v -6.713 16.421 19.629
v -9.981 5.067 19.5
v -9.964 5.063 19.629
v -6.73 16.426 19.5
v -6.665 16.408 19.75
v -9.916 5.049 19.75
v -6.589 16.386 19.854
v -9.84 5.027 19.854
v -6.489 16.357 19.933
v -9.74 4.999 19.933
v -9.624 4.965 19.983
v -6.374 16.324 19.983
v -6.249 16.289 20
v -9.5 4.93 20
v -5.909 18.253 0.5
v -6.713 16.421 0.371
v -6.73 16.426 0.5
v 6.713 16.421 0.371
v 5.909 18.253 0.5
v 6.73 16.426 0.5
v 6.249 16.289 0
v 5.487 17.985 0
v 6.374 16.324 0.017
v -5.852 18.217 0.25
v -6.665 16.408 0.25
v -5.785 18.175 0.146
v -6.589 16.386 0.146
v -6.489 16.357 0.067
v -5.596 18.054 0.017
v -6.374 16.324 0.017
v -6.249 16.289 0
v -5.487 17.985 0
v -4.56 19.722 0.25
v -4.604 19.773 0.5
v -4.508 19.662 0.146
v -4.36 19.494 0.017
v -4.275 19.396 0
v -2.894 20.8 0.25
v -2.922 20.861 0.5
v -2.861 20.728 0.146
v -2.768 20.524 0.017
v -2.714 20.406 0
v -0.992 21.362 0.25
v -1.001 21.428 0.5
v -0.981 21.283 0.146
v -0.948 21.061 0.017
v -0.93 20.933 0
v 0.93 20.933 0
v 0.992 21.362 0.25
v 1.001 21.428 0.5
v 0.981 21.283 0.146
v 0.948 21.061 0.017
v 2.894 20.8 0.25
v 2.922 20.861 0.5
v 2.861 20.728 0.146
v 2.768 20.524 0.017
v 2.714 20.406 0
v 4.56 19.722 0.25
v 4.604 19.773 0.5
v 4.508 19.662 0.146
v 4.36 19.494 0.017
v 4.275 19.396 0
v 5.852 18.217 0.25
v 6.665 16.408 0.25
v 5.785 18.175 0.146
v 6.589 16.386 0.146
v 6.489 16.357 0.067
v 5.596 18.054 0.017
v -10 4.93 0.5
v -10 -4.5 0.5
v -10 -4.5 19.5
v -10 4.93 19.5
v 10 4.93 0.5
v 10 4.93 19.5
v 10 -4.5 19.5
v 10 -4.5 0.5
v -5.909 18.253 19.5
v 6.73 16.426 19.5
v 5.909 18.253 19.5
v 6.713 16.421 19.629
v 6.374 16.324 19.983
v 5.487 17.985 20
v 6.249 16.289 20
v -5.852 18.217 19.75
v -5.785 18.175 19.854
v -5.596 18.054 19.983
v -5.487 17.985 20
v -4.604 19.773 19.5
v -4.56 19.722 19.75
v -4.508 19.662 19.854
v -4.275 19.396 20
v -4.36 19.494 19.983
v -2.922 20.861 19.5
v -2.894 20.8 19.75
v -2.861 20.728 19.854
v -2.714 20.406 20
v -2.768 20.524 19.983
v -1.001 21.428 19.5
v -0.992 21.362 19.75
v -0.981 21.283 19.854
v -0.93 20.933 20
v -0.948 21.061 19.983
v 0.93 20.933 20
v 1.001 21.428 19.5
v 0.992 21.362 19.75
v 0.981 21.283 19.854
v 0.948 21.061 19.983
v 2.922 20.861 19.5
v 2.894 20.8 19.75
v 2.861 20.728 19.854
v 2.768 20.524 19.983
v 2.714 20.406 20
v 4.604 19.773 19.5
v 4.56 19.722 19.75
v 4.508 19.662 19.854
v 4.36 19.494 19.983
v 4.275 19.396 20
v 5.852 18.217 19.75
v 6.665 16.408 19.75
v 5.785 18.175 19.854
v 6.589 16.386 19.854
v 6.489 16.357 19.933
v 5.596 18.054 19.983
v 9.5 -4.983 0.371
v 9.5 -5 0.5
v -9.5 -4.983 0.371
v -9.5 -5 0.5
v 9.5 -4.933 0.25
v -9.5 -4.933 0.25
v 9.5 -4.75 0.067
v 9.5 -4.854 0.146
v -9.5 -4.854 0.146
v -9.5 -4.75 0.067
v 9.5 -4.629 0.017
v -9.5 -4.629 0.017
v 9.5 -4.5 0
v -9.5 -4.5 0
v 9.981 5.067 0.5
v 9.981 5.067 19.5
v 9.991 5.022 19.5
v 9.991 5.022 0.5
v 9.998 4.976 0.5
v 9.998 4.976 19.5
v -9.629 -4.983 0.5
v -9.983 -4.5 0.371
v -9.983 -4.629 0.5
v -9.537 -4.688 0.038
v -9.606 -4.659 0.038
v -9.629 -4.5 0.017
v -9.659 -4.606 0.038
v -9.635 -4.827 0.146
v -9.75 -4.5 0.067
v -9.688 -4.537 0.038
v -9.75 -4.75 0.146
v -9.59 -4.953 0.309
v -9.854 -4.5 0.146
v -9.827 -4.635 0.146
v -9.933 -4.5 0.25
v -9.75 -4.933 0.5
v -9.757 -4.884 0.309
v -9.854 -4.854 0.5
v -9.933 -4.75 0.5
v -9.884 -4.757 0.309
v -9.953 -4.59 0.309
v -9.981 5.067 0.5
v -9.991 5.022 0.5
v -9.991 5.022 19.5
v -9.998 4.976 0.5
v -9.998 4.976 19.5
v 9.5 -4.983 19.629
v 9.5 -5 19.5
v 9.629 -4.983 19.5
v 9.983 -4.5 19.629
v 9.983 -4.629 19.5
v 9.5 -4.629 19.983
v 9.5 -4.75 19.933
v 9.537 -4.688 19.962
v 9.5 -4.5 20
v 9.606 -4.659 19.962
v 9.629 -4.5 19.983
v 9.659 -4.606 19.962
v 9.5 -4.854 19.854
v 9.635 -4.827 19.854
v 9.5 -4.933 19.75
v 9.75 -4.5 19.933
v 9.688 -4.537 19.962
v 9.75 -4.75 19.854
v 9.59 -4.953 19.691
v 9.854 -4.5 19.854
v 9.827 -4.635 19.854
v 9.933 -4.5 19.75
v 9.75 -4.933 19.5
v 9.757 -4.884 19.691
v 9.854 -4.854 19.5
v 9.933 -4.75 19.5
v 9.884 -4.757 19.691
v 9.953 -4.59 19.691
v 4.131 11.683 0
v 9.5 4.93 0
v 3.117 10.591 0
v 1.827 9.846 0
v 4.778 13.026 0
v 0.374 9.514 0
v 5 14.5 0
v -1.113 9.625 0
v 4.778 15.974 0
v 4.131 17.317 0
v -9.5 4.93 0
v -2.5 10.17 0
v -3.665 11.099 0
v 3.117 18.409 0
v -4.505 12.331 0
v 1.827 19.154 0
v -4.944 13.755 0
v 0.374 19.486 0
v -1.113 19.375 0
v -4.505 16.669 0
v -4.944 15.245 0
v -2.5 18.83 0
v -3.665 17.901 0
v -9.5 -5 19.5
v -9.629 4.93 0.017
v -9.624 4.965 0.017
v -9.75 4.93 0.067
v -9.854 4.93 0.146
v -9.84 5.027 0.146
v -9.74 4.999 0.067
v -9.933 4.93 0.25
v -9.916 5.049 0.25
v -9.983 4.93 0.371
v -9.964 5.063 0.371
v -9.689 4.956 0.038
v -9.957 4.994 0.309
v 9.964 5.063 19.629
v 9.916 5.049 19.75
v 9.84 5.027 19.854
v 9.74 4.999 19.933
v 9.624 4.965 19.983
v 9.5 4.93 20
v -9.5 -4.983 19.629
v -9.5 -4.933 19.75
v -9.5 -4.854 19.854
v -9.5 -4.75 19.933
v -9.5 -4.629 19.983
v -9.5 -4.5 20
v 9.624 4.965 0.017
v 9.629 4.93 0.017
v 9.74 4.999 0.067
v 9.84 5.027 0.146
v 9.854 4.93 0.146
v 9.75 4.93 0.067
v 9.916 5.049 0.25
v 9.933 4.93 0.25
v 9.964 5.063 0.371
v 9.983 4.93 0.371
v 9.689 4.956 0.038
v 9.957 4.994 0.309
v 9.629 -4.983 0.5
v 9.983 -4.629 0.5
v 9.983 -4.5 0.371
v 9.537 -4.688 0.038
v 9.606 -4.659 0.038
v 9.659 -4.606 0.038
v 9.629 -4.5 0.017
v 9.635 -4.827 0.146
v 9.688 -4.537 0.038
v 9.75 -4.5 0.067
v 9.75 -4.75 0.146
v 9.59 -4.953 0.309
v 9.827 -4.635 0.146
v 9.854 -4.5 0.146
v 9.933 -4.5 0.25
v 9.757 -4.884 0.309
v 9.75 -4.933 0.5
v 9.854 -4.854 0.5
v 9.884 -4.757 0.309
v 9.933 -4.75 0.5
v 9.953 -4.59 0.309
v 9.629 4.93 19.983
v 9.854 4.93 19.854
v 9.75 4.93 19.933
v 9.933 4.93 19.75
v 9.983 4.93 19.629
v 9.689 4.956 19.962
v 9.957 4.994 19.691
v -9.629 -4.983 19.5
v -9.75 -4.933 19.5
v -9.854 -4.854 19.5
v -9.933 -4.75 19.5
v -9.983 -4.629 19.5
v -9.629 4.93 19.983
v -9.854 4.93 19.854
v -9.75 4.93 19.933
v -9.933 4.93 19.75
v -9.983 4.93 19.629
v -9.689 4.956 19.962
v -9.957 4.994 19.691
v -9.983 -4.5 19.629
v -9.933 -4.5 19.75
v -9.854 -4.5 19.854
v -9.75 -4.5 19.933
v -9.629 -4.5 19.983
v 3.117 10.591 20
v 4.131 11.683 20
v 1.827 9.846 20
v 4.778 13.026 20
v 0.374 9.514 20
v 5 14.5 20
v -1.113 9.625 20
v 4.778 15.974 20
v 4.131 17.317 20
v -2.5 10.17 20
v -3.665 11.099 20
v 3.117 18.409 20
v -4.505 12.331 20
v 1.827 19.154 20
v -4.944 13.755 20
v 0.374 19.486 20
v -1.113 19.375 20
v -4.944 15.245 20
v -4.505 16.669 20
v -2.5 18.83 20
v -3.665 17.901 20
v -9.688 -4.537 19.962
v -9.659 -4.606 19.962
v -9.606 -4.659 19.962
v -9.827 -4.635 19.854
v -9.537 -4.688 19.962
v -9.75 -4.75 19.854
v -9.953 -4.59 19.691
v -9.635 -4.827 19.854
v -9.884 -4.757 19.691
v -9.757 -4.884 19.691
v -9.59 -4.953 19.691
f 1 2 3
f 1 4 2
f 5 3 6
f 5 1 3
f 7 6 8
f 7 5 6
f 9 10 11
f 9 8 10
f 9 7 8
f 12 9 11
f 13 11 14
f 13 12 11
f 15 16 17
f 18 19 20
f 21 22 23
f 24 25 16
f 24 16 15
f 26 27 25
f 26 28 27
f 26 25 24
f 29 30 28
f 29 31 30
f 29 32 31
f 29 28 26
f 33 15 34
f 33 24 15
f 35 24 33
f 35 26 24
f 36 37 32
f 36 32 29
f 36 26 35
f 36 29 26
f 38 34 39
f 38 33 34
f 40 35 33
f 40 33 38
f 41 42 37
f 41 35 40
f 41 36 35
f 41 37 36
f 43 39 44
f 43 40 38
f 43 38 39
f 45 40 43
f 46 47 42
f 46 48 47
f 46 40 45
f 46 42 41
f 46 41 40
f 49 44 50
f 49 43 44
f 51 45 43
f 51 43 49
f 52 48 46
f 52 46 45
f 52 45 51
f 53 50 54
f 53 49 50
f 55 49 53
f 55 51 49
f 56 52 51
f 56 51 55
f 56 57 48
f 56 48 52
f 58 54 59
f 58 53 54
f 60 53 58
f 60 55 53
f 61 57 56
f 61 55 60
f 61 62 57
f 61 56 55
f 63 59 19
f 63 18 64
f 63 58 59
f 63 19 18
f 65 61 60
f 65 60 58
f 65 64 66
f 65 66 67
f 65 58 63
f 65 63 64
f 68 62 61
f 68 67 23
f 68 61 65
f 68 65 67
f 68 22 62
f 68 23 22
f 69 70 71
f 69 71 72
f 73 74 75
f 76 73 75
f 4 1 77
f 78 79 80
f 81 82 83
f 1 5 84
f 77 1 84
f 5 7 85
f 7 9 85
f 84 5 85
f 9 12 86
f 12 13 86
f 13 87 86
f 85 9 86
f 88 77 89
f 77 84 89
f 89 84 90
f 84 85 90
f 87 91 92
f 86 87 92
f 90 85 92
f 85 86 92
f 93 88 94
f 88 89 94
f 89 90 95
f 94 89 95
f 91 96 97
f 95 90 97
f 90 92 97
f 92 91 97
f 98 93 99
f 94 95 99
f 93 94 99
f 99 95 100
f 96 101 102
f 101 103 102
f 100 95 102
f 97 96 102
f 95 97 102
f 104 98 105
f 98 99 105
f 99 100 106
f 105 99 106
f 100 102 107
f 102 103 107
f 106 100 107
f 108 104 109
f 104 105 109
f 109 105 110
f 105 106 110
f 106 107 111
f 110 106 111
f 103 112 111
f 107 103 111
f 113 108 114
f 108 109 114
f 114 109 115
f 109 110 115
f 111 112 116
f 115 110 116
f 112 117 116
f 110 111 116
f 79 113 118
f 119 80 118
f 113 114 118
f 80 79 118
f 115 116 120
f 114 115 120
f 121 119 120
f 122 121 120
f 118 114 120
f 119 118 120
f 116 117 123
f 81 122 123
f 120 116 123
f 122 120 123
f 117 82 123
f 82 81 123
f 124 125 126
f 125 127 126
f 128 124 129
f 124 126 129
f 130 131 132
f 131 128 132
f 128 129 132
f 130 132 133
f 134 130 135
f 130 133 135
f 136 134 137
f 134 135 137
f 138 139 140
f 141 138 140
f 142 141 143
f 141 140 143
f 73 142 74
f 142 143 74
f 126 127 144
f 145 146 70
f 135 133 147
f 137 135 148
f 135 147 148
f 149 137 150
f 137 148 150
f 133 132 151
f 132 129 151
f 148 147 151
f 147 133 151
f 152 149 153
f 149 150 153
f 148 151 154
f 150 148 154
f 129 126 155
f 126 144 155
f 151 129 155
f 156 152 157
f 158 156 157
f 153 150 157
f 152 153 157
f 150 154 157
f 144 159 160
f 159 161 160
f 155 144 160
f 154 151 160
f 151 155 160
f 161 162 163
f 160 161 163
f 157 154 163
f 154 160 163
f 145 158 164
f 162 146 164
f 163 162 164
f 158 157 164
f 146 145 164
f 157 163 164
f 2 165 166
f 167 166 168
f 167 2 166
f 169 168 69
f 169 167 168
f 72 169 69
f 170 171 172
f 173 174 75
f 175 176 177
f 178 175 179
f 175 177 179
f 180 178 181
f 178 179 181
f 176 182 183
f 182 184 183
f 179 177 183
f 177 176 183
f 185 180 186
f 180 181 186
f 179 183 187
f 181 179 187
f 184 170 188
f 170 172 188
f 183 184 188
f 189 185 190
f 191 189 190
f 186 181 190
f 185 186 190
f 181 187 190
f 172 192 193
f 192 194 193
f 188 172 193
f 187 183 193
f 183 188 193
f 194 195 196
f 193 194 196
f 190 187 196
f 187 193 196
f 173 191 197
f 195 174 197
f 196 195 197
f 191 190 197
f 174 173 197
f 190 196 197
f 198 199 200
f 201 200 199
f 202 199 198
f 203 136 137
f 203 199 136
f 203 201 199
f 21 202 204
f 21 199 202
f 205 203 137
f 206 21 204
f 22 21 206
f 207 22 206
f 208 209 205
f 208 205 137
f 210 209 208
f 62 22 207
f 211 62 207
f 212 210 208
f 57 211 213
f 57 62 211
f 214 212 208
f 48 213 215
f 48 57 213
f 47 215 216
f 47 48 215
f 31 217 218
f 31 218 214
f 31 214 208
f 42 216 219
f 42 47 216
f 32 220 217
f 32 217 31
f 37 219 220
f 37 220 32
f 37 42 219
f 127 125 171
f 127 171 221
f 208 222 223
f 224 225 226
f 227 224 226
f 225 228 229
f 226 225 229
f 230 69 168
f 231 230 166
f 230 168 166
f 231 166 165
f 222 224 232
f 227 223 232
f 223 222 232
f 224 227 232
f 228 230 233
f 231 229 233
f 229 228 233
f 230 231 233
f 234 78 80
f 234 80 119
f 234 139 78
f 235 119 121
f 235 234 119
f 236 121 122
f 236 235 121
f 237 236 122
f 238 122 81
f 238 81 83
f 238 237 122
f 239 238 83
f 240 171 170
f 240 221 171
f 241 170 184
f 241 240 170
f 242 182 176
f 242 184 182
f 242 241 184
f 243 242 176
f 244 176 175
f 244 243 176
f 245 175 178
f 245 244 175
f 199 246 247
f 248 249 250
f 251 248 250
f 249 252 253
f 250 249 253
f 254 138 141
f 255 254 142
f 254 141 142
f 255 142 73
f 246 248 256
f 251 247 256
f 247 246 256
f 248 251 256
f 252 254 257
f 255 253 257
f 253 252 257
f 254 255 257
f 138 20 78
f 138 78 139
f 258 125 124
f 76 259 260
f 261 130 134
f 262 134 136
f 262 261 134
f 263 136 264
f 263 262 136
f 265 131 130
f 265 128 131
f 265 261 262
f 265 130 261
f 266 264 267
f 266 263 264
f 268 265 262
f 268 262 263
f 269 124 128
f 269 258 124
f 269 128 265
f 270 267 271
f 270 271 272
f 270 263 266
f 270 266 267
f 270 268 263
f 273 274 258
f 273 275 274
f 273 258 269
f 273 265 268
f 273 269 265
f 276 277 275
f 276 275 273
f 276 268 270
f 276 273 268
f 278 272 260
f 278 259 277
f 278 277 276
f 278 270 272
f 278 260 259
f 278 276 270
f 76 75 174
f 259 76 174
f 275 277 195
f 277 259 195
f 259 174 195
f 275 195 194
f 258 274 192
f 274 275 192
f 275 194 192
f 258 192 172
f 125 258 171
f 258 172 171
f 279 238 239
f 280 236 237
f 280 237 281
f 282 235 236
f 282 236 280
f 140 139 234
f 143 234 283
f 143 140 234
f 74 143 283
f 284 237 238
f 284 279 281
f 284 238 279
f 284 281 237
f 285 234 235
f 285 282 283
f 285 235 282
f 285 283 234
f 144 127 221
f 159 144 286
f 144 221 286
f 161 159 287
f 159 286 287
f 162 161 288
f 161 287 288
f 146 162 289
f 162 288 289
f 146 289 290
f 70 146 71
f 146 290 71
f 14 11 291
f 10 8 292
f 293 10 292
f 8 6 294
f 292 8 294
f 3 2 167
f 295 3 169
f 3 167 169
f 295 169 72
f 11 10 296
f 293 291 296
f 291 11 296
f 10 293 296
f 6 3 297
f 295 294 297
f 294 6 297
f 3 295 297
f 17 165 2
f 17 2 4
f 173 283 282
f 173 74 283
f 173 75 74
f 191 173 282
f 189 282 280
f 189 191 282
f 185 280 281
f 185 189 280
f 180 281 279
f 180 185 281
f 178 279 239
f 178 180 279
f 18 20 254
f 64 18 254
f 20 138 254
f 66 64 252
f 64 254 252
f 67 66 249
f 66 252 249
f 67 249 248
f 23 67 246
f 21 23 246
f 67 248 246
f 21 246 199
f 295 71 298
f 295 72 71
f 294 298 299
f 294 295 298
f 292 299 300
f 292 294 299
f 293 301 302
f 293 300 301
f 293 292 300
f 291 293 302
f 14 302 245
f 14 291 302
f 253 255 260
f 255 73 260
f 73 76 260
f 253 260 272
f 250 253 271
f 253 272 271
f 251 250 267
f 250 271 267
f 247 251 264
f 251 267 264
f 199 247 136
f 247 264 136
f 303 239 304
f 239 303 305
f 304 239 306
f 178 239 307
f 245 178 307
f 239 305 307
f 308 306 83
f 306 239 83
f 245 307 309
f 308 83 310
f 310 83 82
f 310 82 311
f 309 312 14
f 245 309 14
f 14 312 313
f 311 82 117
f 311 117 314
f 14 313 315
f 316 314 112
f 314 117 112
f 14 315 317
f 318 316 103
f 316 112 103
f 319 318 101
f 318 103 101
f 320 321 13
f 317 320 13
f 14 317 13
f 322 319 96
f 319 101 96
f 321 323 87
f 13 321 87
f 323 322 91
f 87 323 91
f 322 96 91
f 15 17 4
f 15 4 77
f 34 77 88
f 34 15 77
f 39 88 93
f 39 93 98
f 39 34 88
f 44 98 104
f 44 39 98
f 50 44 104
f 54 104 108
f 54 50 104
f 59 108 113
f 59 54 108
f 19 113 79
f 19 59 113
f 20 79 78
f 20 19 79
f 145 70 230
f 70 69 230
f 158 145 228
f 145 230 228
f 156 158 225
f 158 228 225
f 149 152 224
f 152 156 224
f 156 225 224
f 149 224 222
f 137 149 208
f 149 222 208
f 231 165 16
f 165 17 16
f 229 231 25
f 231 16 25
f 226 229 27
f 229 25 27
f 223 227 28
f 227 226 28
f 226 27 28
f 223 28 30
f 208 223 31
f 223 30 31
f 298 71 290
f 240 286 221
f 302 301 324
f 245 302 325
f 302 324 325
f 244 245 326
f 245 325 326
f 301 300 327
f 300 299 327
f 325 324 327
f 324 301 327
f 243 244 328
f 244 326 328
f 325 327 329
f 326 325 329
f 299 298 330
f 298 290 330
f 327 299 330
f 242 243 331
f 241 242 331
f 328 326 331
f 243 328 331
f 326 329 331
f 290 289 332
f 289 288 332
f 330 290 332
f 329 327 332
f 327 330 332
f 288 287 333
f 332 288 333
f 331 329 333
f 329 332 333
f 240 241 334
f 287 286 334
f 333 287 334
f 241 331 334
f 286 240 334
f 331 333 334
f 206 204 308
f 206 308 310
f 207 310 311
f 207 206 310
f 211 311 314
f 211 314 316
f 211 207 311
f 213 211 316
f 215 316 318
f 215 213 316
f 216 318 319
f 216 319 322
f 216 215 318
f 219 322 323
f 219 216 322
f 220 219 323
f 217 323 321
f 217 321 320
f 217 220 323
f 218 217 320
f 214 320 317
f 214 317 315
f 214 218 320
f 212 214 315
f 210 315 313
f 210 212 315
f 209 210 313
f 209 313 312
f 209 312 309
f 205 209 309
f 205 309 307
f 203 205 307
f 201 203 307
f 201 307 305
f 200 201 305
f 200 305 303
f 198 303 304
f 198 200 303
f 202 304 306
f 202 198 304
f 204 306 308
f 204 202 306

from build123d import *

# Parameters (mm, degrees)
SKETCH_1_R      = 5
EXTRUDE_1_DEPTH = 20
FILLET_1_R      = 0.5


with BuildPart() as part:
    # 草图1 → 凸台-拉伸1 (new body)
    with BuildSketch(Plane.XY):
        with BuildLine():
            Line((6.729794889, 16.426099883), (10, 5))
            Line((10, 5), (10, -5))
            Line((10, -5), (-10, -5))
            Line((-10, -5), (-10, 5))
            Line((-10, 5), (-6.729794889, 16.426099883))
            ThreePointArc((-6.729794889, 16.426099883), (0, 21.5), (6.729794889, 16.426099883))
        make_face()
        with Locations((0, 14.5)):
            Circle(SKETCH_1_R, mode=Mode.SUBTRACT)
    extrude(amount=EXTRUDE_1_DEPTH)

    # 圆角1
    fillet_1_edges = [part.edges().sort_by_distance(p)[0] for p in [
        (10, -5, 10),
        (-10, -5, 10),
        (-10, 5, 10),
        (10, 5, 10),
        (0, 21.5, 20),
        (-8.364897444, 10.713049941, 20),
        (-10, 0, 20),
        (0, -5, 20),
        (10, 0, 20),
        (0, -5, 0),
        (-10, 0, 0),
        (-8.364897444, 10.713049941, 0),
        (0, 21.5, 0),
        (8.364897444, 10.713049941, 0),
        (10, 0, 0),
        (8.364897444, 10.713049941, 20),
    ]]
    fillet(fillet_1_edges, radius=FILLET_1_R)


solid = part.part
